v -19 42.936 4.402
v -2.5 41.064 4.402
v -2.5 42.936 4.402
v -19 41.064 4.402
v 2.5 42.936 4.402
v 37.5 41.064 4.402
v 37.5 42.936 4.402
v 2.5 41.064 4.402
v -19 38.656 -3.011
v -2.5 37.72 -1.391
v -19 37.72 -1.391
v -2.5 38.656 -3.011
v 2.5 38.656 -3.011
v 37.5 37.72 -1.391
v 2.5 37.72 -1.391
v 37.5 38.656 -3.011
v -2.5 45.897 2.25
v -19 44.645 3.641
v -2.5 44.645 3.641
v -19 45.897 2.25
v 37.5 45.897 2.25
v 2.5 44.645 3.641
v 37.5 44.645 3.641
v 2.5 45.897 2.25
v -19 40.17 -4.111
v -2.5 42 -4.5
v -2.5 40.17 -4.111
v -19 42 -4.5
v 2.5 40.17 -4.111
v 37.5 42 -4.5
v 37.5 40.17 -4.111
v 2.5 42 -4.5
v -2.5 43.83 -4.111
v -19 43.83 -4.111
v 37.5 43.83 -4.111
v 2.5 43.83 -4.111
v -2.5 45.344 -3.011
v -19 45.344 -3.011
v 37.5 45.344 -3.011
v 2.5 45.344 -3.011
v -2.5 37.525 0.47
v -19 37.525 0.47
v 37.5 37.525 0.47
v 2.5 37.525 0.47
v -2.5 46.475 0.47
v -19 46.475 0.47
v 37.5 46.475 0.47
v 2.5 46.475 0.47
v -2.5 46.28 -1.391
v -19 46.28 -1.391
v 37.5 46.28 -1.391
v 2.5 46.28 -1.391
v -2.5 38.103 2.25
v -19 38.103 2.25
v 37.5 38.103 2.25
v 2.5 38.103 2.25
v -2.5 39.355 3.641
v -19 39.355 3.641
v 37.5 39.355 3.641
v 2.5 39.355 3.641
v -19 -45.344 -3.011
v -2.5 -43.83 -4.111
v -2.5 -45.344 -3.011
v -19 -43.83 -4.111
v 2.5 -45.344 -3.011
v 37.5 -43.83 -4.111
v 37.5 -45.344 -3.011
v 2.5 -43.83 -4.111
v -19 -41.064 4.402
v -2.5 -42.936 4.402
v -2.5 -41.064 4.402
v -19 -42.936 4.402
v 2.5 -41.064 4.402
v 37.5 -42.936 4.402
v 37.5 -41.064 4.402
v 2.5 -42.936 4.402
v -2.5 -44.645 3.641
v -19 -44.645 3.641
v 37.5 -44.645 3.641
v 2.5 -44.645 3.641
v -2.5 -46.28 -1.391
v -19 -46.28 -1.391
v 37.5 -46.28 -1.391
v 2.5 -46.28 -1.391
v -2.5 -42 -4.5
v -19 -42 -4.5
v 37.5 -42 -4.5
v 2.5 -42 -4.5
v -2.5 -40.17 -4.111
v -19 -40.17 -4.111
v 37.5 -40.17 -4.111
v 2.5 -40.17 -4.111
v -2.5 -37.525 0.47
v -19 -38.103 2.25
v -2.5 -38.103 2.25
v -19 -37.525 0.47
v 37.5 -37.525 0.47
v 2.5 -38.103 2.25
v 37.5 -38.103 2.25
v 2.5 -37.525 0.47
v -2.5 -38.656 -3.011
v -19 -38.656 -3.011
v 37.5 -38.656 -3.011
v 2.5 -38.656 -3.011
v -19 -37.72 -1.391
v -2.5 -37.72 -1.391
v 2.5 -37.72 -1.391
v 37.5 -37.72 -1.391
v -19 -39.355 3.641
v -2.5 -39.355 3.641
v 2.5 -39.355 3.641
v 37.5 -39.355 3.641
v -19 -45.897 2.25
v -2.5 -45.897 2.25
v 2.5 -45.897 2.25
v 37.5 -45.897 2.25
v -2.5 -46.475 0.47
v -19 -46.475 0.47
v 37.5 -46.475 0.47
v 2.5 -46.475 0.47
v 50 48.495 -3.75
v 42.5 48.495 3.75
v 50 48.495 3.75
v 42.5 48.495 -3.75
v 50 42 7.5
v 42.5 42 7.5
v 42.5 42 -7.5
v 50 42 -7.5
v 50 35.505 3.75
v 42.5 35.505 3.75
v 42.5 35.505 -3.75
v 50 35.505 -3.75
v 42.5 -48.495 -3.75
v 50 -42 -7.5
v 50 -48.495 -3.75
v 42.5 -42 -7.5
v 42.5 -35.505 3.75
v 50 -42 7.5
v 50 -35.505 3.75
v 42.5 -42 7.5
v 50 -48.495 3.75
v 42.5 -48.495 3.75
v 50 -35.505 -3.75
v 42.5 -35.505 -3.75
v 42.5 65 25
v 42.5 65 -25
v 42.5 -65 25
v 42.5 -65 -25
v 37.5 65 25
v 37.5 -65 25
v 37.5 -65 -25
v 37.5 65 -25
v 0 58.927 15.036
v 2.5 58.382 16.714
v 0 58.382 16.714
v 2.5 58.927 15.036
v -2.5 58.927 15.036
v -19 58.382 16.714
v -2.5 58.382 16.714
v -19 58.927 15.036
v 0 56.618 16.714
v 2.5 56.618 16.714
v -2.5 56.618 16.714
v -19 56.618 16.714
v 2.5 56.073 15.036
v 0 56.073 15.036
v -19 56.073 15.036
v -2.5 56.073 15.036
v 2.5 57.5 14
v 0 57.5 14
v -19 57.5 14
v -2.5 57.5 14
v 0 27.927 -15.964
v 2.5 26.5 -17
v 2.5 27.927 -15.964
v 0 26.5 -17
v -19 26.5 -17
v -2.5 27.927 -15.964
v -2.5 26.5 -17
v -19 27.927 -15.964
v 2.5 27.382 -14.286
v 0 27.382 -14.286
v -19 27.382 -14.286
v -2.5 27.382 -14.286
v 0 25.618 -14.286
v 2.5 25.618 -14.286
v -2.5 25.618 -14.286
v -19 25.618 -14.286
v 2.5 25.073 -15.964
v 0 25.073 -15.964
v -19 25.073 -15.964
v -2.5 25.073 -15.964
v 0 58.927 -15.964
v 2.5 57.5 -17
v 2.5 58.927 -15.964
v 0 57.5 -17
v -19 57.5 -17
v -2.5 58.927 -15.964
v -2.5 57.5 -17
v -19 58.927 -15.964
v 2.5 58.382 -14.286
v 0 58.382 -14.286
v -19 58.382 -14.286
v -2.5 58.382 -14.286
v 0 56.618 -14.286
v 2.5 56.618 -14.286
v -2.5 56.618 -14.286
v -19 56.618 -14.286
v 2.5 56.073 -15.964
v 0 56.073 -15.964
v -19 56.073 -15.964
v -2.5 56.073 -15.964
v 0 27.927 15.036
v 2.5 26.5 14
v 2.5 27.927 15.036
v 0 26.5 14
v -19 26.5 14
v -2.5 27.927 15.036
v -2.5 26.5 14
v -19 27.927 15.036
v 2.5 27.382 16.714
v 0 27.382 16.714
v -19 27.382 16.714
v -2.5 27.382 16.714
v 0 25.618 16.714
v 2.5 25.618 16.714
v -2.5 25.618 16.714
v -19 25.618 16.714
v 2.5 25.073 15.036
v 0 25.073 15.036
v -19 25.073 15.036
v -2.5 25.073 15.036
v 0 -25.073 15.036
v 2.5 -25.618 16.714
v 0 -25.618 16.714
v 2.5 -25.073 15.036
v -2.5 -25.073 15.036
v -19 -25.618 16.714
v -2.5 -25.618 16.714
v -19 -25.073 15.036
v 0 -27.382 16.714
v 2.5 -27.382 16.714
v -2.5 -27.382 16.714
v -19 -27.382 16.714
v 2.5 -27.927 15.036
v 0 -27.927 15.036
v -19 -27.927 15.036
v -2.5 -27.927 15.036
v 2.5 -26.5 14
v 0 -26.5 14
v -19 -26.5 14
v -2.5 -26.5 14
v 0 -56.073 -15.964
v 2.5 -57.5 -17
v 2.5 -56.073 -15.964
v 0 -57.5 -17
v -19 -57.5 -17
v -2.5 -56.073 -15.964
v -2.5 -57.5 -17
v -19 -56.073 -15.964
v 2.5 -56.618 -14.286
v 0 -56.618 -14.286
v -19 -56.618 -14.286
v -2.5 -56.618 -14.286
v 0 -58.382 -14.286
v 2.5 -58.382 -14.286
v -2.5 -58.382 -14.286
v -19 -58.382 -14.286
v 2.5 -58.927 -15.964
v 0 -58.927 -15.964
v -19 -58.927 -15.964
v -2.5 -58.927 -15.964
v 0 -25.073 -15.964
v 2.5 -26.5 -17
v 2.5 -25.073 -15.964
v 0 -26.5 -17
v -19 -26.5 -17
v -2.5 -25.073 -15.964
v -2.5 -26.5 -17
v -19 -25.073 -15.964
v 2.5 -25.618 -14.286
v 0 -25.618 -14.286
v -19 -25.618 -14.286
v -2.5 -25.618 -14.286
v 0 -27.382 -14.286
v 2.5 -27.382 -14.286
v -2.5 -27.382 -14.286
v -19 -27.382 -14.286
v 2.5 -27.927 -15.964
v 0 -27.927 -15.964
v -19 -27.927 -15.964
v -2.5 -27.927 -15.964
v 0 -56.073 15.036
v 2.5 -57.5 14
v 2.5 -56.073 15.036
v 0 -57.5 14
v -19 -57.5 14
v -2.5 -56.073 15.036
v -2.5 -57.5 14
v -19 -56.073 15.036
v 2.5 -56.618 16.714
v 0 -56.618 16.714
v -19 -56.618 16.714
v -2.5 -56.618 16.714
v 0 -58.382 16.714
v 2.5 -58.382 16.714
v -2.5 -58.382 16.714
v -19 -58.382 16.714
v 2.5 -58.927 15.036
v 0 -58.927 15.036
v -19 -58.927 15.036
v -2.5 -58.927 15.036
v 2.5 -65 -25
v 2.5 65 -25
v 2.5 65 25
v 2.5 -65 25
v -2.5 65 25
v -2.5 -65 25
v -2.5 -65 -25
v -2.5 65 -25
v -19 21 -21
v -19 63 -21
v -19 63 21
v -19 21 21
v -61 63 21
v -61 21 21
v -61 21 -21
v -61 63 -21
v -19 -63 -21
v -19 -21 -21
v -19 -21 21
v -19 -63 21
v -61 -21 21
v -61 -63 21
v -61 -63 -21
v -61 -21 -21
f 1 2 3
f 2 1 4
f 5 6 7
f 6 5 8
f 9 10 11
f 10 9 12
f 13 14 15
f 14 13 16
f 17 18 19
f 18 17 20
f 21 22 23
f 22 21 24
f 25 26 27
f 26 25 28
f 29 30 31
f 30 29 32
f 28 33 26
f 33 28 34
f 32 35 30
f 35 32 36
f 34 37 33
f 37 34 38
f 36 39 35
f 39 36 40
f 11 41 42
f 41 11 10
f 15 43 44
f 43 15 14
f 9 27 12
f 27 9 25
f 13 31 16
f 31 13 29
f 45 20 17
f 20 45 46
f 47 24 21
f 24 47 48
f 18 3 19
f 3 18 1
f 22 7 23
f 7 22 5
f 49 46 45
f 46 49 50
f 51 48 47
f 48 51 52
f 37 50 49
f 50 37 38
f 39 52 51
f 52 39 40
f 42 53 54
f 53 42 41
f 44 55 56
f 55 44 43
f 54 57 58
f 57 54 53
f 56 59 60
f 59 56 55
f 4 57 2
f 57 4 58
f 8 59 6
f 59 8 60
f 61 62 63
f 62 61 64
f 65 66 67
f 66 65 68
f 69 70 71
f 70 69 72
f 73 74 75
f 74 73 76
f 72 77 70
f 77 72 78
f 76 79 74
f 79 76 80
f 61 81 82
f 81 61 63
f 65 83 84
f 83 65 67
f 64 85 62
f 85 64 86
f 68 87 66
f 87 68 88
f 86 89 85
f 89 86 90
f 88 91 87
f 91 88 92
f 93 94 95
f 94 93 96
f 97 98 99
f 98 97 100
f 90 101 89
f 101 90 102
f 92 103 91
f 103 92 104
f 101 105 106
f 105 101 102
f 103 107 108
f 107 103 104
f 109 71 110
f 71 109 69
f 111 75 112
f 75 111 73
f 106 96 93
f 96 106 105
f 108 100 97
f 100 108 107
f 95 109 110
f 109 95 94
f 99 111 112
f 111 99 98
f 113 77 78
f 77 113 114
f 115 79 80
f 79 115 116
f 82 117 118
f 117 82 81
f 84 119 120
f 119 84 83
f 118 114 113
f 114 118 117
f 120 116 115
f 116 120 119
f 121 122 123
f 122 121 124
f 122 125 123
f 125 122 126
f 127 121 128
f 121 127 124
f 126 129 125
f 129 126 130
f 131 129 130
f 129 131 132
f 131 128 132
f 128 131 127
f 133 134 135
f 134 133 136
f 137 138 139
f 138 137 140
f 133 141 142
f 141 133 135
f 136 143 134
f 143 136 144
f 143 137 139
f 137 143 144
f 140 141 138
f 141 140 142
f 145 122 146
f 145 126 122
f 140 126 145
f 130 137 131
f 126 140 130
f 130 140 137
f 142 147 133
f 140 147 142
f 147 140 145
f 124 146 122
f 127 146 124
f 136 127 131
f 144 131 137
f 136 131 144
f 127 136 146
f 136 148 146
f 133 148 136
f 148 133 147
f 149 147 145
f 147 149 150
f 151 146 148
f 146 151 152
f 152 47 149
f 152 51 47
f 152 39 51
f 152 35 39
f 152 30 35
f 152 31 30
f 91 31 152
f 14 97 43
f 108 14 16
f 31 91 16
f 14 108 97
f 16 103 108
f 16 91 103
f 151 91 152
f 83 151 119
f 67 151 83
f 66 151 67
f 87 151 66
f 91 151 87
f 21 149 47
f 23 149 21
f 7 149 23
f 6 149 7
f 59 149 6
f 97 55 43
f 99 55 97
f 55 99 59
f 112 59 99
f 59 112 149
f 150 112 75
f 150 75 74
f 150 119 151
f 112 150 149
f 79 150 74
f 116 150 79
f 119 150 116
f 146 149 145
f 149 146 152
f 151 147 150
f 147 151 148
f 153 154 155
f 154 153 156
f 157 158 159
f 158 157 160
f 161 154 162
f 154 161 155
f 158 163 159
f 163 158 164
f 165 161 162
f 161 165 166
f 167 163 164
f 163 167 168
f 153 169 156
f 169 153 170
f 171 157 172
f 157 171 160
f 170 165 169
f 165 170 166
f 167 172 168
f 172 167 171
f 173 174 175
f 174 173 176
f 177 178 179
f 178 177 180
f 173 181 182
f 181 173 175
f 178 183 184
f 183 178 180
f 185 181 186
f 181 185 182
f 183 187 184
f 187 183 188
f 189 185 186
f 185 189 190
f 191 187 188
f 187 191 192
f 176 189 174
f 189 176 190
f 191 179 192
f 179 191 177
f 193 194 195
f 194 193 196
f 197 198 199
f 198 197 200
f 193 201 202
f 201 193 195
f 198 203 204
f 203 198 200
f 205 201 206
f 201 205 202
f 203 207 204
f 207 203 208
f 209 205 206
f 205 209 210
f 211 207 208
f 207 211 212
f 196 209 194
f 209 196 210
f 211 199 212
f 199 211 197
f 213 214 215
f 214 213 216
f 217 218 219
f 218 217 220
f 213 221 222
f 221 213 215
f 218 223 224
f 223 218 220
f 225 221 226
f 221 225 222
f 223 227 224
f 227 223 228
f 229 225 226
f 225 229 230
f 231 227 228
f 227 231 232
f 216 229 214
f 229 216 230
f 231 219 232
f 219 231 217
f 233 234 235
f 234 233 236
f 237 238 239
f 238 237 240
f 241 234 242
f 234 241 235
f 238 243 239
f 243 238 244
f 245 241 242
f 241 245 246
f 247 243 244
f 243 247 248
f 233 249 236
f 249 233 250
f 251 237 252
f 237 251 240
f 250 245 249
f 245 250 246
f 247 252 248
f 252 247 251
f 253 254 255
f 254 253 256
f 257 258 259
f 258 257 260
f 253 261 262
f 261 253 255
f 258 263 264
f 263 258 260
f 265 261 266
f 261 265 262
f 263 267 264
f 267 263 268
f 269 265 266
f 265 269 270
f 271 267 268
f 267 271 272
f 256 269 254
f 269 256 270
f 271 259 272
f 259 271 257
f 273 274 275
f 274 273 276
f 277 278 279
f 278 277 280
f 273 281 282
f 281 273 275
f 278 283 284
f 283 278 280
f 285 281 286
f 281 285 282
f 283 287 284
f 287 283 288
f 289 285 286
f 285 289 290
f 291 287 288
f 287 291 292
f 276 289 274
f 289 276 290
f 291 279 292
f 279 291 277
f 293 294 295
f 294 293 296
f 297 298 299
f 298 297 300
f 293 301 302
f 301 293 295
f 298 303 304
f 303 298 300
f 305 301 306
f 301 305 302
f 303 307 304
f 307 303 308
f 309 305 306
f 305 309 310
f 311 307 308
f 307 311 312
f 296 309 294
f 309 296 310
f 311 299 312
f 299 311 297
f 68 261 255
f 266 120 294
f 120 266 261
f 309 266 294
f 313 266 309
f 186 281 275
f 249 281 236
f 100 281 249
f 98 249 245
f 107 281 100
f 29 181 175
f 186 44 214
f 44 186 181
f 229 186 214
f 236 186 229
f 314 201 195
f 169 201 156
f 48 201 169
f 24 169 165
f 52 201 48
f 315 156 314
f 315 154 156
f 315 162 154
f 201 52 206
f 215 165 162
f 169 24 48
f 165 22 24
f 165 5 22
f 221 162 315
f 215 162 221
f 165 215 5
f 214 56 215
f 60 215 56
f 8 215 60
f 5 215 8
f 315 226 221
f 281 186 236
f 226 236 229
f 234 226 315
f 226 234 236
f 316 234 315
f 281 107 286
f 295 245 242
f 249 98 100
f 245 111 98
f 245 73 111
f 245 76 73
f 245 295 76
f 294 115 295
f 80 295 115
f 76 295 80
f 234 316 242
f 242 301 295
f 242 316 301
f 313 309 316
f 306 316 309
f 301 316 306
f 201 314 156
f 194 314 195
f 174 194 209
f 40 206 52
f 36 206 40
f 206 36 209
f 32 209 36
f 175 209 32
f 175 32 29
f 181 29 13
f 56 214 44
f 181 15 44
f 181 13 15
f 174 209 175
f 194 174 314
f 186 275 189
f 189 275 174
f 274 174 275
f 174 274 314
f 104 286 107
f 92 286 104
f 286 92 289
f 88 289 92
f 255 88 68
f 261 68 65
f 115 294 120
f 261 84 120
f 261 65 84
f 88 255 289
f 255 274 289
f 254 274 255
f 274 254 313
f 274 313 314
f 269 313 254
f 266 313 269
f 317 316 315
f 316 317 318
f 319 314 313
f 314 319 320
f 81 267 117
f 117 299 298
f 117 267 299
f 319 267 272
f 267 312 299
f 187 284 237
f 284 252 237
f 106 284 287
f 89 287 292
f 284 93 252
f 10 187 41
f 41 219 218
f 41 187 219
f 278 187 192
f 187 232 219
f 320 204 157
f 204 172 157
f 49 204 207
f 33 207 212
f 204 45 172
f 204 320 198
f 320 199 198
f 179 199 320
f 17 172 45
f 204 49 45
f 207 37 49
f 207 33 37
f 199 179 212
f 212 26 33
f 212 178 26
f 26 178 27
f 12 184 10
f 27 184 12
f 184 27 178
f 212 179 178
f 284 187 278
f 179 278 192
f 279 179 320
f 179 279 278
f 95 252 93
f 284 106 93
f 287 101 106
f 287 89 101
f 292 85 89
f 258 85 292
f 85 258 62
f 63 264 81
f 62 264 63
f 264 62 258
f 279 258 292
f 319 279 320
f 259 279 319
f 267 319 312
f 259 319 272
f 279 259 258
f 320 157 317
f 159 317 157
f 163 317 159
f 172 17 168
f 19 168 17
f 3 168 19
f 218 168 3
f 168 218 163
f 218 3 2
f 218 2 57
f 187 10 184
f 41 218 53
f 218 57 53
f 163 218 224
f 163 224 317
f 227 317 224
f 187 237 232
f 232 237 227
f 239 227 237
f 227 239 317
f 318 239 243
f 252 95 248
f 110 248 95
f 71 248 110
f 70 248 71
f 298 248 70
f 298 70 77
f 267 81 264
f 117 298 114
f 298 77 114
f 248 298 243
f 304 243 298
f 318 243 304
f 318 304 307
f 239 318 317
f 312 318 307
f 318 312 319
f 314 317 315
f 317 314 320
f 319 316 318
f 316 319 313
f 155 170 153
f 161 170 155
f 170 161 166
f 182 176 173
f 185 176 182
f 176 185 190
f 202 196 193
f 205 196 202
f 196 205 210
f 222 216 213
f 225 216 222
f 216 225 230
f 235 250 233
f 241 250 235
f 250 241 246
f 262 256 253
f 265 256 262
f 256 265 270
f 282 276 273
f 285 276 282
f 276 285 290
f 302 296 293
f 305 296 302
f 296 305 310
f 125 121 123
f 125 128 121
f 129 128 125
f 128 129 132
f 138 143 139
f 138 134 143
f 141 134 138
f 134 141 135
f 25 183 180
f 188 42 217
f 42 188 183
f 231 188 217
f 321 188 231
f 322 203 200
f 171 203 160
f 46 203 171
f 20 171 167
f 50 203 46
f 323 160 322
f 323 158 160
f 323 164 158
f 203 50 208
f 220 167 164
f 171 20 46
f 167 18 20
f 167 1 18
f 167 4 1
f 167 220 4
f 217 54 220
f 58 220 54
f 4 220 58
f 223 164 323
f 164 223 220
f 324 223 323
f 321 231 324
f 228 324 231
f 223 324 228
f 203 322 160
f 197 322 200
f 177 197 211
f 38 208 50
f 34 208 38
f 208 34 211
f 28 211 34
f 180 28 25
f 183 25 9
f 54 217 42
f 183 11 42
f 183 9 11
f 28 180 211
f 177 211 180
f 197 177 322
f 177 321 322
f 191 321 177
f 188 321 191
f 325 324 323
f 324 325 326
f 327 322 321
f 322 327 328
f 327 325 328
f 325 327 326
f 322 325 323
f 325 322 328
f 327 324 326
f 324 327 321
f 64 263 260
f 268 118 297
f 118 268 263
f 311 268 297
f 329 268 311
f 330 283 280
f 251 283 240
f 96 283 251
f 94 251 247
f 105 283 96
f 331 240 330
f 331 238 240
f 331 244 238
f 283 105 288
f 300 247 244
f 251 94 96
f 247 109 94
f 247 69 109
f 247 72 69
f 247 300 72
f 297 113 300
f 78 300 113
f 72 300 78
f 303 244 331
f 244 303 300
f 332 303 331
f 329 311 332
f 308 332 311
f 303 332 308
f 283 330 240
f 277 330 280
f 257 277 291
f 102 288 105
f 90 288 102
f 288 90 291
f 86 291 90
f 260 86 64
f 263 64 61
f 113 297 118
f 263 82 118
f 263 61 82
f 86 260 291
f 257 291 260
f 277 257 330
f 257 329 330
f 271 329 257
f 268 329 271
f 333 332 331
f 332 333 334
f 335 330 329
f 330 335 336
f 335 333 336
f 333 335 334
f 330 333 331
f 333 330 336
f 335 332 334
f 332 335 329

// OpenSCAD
wall_thickness		= 5;
nut_size					= 15;
rod_diamiter			= 9;
screw_spacing		= 31;
motor_distance		= 84;
wall_width				= 130;
wall_height			= 50;
sides_on_nut			= 6;
screw_diamiter		= 3;


translate([40,0,0]) wall_one();
wall_two();

color([0.75,0.75,0.75]) motor_dont_render();

module wall_one(){
	difference(){
		wall_one_added();
		wall_one_taken();
	}
}


module wall_one_added(){
		cube([wall_thickness,wall_width,wall_height],center=true);
}
	
module wall_one_taken(){
		rotate([0,90,0]) translate([0,motor_distance/2,-20]) cylinder(h=50, d=rod_diamiter, center=true);
		rotate([0,90,0]) translate([0,-motor_distance/2,-20]) cylinder(h=50, d=rod_diamiter, center=true);
		rotate([0,90,0]) translate([0,motor_distance/2,10/2]) cylinder(h=10, d=nut_size, center=true, $fn=sides_on_nut);
		rotate([0,90,0]) translate([0,-motor_distance/2,10/2]) cylinder(h=10, d=nut_size, center=true, $fn=sides_on_nut);
}

module wall_two(){
	difference(){
		wall_two_added();
		wall_two_taken();
	}
}


module wall_two_added(){
		cube([wall_thickness,wall_width,wall_height],center=true);
}
	
module wall_two_taken(){
		rotate([0,90,0]) translate([0,motor_distance/2,0]) cylinder(h=20, d=rod_diamiter, center=true);
		rotate([0,90,0]) translate([0,-motor_distance/2,0]) cylinder(h=20, d=rod_diamiter, center=true);
		translate([0,motor_distance/2,0]) motor();
		translate([0,-motor_distance/2,0]) motor();
}

module motor(){
	translate([0,screw_spacing/2,screw_spacing/2]) rotate([0,90,0]) cylinder(d=screw_diamiter, h=20, center=true);
	translate([0,-screw_spacing/2,-screw_spacing/2]) rotate([0,90,0]) cylinder(d=screw_diamiter, h=20, center=true);
	translate([0,screw_spacing/2,-screw_spacing/2]) rotate([0,90,0]) cylinder(d=screw_diamiter, h=20, center=true);
	translate([0,-screw_spacing/2,screw_spacing/2]) rotate([0,90,0]) cylinder(d=screw_diamiter, h=20, center=true);
}

module motor_dont_render(){
	translate([-40,motor_distance/2,0]) cube([42,42,42], center=true);
	translate([-40,-motor_distance/2,0]) cube([42,42,42], center=true);
	translate([-10,0,0]) wall_two_taken();
	translate([40,0,0]) wall_one_taken();
}
